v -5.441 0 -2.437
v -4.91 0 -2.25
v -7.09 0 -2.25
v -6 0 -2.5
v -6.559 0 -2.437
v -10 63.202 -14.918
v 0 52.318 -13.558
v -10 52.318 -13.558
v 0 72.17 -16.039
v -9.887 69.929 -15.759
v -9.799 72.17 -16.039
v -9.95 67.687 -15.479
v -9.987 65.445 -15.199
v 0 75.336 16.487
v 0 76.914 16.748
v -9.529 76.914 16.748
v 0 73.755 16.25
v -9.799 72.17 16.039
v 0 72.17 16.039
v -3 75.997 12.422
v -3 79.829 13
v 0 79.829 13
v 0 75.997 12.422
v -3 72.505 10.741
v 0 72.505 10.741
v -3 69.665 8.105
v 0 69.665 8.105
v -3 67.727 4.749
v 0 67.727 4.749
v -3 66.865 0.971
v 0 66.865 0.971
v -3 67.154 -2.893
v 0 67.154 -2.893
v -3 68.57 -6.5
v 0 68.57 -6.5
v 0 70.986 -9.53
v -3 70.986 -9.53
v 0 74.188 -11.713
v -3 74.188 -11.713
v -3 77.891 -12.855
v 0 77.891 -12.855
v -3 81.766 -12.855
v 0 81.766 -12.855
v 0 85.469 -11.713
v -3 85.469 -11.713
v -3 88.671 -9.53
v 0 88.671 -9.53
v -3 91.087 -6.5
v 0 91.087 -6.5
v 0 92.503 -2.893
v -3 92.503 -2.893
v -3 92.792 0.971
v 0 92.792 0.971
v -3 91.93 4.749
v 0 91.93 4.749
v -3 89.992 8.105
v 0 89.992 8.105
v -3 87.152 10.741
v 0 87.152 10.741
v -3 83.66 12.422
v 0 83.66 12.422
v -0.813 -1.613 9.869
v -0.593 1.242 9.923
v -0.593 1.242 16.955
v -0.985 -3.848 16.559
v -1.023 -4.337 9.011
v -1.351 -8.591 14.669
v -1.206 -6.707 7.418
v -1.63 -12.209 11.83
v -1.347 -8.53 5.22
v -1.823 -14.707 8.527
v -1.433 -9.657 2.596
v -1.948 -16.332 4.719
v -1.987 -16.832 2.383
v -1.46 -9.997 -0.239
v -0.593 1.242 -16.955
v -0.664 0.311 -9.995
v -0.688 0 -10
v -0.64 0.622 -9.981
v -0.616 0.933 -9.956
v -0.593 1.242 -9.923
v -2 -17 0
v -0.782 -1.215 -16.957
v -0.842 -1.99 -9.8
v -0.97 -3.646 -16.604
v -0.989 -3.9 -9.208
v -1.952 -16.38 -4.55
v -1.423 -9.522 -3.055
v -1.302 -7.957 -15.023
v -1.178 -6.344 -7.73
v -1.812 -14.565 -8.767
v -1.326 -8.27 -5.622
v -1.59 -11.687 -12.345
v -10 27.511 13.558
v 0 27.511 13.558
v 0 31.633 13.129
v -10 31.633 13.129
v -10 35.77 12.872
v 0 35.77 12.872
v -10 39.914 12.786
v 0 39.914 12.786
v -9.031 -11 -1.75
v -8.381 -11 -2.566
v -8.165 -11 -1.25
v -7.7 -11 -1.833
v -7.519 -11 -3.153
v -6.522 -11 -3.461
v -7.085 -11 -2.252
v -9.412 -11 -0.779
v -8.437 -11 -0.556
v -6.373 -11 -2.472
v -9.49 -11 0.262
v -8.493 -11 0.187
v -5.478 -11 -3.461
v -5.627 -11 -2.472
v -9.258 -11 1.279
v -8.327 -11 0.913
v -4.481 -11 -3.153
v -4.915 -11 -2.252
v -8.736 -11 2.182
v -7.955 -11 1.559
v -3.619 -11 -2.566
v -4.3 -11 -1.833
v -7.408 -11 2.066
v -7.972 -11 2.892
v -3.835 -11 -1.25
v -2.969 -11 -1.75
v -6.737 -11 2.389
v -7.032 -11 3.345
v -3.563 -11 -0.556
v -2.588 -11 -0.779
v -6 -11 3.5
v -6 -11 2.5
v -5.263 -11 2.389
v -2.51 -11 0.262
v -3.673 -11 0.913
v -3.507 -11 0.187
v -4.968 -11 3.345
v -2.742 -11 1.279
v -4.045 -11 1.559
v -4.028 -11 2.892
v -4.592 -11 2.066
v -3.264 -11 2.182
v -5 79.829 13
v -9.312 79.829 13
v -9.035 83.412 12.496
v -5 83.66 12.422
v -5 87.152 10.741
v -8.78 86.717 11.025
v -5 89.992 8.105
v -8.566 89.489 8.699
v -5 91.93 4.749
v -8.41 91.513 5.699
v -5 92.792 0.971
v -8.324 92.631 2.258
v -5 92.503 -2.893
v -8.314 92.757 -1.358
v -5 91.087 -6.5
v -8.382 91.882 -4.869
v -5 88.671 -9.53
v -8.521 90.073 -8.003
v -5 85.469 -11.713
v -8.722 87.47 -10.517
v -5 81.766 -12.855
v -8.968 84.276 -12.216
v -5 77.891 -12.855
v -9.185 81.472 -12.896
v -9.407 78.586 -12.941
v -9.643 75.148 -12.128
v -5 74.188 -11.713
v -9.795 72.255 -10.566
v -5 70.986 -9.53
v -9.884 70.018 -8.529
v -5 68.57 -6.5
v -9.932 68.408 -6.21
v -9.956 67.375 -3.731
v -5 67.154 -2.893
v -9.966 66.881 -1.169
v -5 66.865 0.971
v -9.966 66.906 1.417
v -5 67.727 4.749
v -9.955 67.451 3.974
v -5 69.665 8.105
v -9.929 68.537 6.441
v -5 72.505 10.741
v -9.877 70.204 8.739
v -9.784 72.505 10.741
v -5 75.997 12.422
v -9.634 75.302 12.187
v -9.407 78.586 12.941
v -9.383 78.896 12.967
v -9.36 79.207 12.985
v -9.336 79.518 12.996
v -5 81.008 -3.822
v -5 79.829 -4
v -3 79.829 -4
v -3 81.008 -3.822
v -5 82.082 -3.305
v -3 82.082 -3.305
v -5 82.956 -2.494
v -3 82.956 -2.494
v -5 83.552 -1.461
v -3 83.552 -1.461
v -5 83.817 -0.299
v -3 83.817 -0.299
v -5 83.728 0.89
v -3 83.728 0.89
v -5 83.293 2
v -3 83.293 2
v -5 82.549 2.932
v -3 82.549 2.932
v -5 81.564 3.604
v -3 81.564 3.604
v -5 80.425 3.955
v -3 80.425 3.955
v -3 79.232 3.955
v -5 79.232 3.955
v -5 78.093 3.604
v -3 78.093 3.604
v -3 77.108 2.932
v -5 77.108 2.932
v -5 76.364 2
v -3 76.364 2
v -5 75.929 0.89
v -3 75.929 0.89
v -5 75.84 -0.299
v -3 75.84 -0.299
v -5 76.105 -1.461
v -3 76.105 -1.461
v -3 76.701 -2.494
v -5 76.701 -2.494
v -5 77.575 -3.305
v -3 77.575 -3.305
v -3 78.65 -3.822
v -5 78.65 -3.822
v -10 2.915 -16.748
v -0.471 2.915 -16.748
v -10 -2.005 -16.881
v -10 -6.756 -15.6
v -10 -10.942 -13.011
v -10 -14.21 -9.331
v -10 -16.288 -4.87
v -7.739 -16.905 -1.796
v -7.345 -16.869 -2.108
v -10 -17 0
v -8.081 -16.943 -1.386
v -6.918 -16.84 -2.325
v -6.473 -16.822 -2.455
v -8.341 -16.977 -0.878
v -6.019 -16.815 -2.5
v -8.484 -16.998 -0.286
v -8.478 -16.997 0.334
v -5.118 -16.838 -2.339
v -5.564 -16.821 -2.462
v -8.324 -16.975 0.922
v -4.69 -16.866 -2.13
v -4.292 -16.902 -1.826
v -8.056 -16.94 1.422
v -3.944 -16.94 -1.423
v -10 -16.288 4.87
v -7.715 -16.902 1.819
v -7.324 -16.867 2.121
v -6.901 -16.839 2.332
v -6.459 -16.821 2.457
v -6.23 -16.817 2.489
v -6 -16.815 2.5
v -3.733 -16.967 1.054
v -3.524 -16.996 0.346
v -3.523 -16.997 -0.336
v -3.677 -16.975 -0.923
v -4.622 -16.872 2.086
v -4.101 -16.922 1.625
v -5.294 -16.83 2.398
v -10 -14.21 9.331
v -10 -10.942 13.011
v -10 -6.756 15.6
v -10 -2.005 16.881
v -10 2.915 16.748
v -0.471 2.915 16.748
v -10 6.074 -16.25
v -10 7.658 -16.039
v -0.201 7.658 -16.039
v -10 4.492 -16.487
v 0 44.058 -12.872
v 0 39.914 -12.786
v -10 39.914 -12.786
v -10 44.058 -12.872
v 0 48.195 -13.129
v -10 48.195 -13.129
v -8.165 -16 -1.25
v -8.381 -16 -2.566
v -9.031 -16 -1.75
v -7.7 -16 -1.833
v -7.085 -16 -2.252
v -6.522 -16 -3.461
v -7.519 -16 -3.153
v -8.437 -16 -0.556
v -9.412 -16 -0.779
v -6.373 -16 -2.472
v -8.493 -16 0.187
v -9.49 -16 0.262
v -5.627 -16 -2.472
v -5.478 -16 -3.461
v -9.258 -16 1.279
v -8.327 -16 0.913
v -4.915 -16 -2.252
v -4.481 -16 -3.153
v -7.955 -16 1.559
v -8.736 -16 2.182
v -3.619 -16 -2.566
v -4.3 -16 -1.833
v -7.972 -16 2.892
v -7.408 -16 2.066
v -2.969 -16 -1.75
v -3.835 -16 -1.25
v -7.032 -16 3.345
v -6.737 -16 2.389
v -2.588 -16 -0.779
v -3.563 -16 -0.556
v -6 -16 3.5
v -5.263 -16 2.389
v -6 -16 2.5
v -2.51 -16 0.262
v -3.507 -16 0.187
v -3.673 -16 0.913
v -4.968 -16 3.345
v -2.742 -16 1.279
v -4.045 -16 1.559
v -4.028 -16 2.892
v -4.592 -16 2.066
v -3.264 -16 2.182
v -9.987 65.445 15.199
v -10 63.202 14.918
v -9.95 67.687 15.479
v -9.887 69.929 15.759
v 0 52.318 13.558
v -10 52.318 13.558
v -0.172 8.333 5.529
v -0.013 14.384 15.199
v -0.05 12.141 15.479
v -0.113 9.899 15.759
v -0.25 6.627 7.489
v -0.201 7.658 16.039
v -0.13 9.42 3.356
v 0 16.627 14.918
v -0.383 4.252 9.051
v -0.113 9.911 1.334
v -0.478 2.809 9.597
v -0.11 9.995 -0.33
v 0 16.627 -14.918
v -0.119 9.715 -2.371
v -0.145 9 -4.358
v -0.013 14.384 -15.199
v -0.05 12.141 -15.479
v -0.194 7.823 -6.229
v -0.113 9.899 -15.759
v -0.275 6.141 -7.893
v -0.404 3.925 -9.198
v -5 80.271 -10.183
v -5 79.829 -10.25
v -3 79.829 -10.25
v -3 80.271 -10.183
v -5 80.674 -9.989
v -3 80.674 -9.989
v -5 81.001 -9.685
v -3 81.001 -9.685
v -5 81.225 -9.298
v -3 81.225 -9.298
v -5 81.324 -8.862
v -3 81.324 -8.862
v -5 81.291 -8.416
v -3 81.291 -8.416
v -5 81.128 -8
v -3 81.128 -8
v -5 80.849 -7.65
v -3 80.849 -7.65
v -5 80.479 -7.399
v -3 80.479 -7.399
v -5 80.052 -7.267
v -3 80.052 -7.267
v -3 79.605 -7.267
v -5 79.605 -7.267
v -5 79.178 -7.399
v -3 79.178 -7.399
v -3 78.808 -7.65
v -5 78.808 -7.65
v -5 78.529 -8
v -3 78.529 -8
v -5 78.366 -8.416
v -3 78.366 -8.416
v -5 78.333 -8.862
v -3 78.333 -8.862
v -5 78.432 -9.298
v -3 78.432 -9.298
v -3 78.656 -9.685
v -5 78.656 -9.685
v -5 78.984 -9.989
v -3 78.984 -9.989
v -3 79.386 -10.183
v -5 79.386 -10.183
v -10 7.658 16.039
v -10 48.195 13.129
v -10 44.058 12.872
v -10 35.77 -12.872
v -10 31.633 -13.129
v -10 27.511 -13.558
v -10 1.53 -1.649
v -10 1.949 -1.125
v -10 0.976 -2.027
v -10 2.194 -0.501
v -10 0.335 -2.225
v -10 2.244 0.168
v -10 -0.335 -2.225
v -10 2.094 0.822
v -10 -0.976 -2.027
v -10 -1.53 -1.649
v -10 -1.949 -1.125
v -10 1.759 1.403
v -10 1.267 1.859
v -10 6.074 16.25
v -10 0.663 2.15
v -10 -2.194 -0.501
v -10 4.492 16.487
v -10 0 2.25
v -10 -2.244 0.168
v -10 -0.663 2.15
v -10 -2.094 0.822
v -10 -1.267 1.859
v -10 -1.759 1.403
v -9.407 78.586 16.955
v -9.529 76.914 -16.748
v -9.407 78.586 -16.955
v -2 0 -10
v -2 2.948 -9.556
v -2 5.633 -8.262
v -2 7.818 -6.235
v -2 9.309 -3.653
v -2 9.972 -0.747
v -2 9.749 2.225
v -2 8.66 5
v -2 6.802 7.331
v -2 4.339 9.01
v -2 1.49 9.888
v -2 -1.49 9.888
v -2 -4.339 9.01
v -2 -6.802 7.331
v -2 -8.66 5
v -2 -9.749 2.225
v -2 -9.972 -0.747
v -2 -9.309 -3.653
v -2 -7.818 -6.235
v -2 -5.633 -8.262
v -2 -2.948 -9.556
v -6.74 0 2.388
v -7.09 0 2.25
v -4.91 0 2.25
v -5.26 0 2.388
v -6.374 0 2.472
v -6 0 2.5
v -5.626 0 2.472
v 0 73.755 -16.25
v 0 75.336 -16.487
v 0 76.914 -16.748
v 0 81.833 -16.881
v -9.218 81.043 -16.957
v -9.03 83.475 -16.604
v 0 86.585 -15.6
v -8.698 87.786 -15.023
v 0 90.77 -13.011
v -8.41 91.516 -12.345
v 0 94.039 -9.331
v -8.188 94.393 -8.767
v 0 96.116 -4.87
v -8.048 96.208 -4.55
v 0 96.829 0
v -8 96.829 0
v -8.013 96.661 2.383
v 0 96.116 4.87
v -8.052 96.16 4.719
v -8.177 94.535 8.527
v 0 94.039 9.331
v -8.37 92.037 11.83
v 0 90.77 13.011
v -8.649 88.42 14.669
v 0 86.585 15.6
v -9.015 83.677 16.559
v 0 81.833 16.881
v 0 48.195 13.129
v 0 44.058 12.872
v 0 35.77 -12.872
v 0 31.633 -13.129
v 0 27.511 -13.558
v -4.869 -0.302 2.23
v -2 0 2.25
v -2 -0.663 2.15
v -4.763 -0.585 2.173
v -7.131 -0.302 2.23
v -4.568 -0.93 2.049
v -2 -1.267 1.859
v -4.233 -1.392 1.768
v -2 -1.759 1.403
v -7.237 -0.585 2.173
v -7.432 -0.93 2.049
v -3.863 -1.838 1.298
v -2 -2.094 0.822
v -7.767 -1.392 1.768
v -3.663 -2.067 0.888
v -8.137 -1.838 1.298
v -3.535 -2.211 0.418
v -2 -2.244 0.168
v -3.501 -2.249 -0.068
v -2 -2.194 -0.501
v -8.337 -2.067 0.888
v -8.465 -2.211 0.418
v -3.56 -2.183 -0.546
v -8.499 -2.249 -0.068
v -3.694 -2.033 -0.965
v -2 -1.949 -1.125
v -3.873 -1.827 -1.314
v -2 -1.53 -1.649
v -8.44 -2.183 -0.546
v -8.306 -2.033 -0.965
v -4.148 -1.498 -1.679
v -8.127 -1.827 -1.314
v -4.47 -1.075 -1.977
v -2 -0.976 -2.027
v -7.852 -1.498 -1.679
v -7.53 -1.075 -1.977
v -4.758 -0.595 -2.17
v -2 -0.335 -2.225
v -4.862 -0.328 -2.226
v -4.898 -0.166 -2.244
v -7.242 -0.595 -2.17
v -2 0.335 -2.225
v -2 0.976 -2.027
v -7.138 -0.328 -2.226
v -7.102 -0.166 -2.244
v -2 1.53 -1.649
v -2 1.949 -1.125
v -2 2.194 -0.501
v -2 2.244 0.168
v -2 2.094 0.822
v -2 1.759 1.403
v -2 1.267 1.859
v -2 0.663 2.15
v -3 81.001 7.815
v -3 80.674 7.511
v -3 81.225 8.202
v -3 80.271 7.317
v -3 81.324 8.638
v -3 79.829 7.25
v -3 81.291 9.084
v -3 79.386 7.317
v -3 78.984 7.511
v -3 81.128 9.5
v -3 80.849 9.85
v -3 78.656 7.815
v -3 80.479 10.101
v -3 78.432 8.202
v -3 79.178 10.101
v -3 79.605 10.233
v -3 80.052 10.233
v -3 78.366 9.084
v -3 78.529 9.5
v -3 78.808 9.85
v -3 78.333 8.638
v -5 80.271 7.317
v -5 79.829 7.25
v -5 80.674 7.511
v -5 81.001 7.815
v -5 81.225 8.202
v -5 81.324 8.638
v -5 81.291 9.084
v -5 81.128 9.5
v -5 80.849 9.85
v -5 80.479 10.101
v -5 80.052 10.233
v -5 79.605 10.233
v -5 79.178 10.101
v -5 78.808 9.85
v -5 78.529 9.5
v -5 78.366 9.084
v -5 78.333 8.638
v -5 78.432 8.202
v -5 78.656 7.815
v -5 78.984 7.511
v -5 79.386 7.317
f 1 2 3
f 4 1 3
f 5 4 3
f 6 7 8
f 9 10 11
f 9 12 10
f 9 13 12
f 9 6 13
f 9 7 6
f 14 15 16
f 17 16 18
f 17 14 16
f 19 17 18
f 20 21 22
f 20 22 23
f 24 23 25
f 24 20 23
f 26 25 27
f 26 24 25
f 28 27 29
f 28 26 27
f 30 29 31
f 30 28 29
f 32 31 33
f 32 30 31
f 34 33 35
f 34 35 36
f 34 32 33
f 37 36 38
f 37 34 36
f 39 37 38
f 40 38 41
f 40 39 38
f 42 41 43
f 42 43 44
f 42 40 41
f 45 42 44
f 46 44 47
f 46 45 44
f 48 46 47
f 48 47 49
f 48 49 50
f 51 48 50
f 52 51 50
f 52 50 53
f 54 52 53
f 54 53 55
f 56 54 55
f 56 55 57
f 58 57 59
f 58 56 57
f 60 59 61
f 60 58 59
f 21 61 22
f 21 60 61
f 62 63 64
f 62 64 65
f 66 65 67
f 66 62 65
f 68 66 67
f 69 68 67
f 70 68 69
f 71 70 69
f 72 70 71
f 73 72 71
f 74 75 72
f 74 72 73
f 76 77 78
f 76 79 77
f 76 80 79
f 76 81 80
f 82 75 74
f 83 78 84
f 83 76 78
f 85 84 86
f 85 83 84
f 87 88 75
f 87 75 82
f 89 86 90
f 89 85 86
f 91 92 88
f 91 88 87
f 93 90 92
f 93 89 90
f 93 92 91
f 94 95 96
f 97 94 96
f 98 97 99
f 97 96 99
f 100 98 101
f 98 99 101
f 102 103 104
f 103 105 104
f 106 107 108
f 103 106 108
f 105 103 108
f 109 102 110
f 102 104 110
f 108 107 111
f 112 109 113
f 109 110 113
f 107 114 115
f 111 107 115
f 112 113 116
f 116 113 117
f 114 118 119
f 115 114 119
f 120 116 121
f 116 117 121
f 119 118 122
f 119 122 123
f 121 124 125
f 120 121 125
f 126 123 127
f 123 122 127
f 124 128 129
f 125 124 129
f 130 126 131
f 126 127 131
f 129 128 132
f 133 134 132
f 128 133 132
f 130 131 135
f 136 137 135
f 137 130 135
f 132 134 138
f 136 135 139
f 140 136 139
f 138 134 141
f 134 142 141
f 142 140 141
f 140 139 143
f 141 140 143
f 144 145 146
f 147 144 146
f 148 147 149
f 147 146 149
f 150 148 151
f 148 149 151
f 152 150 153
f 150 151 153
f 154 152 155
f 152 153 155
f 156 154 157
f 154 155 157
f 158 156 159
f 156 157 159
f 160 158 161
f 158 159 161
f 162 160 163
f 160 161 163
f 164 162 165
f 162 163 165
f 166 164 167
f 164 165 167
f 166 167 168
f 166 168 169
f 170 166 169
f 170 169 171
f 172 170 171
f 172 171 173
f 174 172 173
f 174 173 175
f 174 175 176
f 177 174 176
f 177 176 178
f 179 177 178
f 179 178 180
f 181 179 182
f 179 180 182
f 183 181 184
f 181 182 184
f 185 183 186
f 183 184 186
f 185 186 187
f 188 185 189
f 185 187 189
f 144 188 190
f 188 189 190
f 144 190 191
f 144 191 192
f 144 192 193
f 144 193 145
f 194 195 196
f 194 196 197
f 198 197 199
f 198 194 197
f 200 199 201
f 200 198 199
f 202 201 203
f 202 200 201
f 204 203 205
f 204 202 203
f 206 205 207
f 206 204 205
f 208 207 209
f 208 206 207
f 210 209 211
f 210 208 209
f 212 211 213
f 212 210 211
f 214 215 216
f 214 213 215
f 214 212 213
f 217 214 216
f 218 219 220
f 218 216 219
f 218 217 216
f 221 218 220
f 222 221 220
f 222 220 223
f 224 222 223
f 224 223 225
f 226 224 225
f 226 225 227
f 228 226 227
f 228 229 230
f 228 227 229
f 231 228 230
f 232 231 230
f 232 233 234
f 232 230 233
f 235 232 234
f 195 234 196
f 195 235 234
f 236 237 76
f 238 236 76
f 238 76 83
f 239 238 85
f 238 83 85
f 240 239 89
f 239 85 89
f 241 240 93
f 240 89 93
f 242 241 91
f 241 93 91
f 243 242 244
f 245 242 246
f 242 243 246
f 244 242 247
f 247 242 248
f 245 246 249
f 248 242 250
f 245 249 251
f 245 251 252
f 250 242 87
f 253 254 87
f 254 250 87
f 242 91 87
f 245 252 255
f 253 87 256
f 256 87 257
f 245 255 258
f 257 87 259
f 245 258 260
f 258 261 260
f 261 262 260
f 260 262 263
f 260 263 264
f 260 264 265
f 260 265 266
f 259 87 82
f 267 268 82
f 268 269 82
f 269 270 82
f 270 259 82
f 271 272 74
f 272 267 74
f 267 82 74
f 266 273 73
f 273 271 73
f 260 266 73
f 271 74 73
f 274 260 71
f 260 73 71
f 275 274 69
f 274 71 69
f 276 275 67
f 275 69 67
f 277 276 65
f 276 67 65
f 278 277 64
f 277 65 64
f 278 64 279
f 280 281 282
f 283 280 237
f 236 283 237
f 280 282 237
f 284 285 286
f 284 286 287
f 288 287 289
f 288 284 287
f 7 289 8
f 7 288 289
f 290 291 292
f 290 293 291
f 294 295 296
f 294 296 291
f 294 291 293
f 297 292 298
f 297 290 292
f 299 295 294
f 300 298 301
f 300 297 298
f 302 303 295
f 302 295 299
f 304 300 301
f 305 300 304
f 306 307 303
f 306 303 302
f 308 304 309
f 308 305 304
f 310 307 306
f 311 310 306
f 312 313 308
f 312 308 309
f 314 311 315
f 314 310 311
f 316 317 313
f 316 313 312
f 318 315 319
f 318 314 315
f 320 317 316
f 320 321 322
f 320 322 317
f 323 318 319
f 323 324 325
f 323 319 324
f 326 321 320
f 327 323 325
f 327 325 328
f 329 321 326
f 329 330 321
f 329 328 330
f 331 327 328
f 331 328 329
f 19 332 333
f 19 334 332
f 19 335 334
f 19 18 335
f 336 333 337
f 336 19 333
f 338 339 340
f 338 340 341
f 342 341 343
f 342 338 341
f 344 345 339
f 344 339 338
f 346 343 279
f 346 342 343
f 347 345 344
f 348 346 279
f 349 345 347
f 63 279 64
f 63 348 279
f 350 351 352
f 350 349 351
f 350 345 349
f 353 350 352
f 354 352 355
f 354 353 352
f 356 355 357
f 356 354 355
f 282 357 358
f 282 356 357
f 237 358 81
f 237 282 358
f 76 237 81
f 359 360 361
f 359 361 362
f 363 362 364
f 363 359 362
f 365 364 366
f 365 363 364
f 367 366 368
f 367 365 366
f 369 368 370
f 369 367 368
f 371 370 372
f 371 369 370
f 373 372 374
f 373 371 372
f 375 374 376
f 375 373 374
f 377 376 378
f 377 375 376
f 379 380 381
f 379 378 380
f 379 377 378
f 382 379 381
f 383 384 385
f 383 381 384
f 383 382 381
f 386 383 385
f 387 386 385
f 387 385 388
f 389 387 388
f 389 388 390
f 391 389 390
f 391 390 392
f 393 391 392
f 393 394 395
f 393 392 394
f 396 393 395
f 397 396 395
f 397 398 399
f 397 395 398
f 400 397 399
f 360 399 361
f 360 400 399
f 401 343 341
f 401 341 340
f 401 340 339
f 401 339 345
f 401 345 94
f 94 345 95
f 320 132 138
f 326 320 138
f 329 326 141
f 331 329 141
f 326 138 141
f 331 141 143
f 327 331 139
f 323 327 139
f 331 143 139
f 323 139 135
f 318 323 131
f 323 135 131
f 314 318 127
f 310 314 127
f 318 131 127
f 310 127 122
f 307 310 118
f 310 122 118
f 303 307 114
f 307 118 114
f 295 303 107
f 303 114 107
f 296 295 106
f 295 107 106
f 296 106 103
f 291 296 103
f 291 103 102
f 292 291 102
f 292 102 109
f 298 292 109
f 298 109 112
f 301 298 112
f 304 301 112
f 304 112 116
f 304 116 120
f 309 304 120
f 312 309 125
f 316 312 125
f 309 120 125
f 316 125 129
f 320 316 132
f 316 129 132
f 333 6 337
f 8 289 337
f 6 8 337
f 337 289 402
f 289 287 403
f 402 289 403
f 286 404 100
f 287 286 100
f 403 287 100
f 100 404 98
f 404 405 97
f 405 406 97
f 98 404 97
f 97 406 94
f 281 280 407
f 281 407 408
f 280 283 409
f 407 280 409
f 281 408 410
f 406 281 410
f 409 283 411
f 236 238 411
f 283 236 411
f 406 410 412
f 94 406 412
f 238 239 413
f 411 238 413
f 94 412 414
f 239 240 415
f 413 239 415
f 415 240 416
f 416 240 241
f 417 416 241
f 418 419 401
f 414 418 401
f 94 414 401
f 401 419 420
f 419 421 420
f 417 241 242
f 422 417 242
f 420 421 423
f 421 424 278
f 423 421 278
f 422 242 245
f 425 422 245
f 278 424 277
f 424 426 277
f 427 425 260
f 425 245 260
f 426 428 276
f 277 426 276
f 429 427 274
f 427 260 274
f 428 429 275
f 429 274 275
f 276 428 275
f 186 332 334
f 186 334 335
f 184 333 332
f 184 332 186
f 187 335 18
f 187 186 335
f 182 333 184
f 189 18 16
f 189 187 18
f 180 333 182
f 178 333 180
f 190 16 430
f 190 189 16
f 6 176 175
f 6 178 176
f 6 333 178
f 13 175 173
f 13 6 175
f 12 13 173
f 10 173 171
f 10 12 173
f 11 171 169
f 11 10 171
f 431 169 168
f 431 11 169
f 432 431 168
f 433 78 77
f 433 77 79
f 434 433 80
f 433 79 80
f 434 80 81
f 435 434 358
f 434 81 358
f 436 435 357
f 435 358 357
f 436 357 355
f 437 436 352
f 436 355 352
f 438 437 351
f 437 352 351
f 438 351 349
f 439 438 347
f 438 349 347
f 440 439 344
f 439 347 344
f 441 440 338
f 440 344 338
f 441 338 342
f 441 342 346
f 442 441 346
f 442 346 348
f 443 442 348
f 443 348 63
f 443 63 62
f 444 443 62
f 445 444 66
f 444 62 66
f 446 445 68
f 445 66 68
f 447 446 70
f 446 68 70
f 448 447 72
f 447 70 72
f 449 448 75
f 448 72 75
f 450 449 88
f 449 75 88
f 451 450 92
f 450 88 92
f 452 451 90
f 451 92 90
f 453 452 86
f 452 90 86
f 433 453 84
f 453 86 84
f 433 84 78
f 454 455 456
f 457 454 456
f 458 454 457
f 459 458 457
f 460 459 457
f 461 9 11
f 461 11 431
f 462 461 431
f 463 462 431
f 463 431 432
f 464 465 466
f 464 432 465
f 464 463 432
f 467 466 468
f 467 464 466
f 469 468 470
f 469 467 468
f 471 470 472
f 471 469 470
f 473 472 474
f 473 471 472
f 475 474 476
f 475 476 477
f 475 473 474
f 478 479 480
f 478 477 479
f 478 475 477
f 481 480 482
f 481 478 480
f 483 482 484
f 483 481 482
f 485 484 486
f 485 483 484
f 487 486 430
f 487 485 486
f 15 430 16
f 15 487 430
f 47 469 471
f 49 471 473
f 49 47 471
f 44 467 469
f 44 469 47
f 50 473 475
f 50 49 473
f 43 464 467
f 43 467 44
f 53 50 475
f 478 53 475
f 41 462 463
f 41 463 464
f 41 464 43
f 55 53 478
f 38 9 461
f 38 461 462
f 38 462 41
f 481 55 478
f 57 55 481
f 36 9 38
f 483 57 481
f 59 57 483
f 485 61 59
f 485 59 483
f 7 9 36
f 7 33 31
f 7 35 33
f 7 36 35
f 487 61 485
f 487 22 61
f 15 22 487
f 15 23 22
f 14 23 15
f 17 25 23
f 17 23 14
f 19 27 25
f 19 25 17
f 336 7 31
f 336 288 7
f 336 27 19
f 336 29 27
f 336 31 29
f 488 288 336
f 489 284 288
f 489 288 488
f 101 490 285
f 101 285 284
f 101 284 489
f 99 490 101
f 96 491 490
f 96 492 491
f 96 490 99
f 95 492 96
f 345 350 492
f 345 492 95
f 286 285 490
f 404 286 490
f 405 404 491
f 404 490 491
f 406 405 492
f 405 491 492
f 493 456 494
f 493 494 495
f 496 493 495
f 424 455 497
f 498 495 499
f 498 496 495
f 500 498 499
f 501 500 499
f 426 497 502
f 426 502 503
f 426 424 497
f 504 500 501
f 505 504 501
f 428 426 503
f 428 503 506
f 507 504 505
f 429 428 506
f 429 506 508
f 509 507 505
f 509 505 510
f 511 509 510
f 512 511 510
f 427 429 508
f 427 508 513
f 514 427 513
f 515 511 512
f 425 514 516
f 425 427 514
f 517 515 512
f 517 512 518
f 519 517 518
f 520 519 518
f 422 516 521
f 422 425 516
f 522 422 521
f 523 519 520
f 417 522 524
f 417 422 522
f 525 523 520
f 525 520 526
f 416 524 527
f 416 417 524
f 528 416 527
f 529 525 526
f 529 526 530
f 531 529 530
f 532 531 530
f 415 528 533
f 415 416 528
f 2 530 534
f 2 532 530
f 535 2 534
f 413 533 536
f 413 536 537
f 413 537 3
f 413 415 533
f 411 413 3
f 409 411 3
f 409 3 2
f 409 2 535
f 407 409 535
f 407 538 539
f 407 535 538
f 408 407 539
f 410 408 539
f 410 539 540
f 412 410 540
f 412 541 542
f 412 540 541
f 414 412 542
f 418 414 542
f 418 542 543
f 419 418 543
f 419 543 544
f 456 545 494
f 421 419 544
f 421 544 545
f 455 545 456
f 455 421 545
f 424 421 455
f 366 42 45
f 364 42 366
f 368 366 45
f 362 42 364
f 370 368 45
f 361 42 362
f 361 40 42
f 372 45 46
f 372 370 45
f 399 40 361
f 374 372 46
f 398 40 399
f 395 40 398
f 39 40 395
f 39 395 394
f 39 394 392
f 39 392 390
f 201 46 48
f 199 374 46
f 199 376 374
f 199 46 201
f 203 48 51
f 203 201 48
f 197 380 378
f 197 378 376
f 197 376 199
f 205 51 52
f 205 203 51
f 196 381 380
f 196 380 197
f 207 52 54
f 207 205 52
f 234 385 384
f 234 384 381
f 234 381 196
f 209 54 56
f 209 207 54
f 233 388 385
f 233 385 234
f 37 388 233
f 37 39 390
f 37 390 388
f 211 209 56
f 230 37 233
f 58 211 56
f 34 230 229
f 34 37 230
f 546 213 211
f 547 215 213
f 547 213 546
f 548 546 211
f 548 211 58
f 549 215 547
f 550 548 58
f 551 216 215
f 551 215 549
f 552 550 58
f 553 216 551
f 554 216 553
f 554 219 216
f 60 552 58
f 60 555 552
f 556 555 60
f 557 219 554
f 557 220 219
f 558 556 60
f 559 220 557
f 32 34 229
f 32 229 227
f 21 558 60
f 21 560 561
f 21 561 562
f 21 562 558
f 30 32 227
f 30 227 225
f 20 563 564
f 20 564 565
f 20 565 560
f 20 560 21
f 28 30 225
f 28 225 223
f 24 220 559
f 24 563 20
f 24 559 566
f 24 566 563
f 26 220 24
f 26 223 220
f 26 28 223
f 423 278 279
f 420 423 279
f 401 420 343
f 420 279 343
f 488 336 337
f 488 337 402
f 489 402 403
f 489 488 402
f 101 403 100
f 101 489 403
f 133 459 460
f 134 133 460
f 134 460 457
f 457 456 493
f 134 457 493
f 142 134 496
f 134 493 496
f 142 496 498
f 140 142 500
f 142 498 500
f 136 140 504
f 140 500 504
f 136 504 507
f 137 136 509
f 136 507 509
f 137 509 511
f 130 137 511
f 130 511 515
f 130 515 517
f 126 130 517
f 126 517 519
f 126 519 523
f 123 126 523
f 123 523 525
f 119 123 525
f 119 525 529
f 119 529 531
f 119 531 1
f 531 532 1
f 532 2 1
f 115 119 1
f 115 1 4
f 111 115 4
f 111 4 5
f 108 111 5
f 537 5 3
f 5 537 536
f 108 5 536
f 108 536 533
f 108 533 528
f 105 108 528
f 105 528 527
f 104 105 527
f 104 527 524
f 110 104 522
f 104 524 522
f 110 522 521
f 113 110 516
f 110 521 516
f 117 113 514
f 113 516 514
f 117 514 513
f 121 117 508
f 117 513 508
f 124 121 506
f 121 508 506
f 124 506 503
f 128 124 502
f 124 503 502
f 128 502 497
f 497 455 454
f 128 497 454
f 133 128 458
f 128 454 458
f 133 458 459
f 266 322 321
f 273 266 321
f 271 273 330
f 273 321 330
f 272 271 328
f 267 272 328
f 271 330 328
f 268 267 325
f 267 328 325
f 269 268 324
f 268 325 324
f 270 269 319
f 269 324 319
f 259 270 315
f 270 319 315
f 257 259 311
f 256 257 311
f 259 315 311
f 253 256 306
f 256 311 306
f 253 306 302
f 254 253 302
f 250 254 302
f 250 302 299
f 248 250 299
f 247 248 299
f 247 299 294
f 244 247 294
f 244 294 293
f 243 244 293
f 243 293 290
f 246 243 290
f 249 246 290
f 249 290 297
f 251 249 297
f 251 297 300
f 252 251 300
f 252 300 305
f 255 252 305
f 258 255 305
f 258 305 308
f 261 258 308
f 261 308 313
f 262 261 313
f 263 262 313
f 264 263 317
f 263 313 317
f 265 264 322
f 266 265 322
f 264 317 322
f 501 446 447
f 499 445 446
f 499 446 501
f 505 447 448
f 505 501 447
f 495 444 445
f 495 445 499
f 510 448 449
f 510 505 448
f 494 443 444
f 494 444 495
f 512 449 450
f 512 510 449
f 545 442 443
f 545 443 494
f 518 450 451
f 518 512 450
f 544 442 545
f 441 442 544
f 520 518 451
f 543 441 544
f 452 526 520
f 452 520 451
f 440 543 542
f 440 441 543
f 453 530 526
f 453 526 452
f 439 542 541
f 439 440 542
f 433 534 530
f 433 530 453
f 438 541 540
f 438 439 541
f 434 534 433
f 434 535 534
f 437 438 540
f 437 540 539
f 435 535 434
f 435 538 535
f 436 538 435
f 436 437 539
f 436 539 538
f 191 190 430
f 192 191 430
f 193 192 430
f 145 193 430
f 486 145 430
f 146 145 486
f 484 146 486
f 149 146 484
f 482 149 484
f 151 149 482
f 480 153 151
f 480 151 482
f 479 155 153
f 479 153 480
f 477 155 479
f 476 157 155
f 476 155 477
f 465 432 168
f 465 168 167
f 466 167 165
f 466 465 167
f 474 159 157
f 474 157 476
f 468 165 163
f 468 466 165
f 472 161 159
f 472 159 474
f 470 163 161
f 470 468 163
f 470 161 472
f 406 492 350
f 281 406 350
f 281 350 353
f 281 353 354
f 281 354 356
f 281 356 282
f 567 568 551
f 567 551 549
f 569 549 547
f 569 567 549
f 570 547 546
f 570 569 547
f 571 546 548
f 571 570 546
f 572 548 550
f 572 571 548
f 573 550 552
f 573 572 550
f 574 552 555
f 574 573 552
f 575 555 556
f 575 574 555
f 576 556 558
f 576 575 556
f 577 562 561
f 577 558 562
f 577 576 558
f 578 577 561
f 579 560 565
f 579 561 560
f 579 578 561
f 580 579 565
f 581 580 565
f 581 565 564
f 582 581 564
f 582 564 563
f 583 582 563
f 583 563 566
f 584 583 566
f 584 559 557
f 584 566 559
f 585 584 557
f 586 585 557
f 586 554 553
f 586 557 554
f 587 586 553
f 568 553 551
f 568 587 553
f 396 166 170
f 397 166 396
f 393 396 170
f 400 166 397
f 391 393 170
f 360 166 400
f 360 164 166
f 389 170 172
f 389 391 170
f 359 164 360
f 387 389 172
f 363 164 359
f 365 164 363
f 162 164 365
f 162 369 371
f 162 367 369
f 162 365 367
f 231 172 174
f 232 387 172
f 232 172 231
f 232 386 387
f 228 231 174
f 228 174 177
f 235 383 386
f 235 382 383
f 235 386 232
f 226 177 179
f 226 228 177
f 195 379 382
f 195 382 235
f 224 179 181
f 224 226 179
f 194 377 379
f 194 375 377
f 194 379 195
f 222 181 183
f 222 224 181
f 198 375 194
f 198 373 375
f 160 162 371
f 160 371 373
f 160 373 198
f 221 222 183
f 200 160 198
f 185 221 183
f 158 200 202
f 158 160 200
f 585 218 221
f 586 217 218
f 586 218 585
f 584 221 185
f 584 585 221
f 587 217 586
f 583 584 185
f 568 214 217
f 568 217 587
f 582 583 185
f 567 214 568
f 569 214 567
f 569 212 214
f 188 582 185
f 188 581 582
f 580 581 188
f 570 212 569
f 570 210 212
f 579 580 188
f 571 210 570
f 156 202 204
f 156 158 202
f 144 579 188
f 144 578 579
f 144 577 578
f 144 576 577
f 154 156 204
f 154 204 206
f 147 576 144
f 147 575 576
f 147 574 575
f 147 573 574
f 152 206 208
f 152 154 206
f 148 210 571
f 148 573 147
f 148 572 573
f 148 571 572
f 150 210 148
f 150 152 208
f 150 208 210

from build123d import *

# Parameters (mm, degrees)
SALIENTE_EXTRUIR1_DEPTH     = 10
CROQUIS3_R                  = 10
CORTAR_EXTRUIR1_DEPTH       = 2
CORTAR_EXTRUIR5_START       = -10
CROQUIS7_R                  = 2.25
CORTAR_EXTRUIR5_DEPTH       = 55.115174372
CROQUIS8_R                  = 2.5
CORTAR_EXTRUIR6_DEPTH       = 19
CORTAR_EXTRUIR19_START      = -11
CROQUIS12_R                 = 3.5
CORTAR_EXTRUIR19_DEPTH      = 5
CORTAR_EXTRUIR20_DEPTH      = 99.634499619
CORTAR_EXTRUIR20_DEPTH_BACK = 99.634499619
CROQUIS13_R                 = 4
CROQUIS13_R_2               = 1.5
CROQUIS17_R                 = 13
CORTAR_EXTRUIR22_DEPTH      = 5
CORTAR_EXTRUIR23_START      = -3
CROQUIS15_R                 = 13
CORTAR_EXTRUIR23_DEPTH      = 3
CORTAR_EXTRUIR24_DEPTH      = 99.816823039
CORTAR_EXTRUIR24_DEPTH_BACK = 99.816823039
CROQUIS18_OUTSIDE_W         = 35.844
CROQUIS18_OUTSIDE_H         = 139.673


with BuildPart() as part:
    # Croquis1 → Saliente-Extruir1 (new body)
    with BuildSketch(Plane(origin=(0, 0, 0), x_dir=(0, 0, -1), z_dir=(1, 0, 0))):
        with BuildLine():
            Line((-16.039395606, 7.658342494), (-13.557839382, 27.510792285))
            ThreePointArc((-13.557839382, 27.510792285), (-12.978866844, 33.700521588), (-12.785627053, 39.914265744))
            Line((-12.785627053, 39.914265744), (12.785627053, 39.914265744))
            ThreePointArc((12.785627053, 39.914265744), (12.978866844, 33.700521588), (13.557839382, 27.510792285))
            Line((13.557839382, 27.510792285), (16.039395606, 7.658342494))
            ThreePointArc((16.039395606, 7.658342494), (16.365368489, 5.282403528), (16.748223211, 2.914964711))
            ThreePointArc((16.748223211, 2.914964711), (0, -17), (-16.748223211, 2.914964711))
            ThreePointArc((-16.748223211, 2.914964711), (-16.365368489, 5.282403528), (-16.039395606, 7.658342494))
        make_face()
    saliente_extruir1 = extrude(amount=-SALIENTE_EXTRUIR1_DEPTH)

    # Croquis3 → Cortar-Extruir1 (cut)
    with BuildSketch(Plane(origin=(0, 0, 0), x_dir=(0, 0, -1), z_dir=(1, 0, 0))):
        Circle(CROQUIS3_R)
    cortar_extruir1 = extrude(amount=-CORTAR_EXTRUIR1_DEPTH, mode=Mode.SUBTRACT)

    # Croquis7 → Cortar-Extruir5 (cut)
    with BuildSketch(Plane(origin=(-2, 0, 0), x_dir=(0, 0, -1), z_dir=(1, 0, 0)).offset(CORTAR_EXTRUIR5_START)):
        with Locations(Location((0, 0, 0), (0, 0, 180))):
            Circle(CROQUIS7_R)
    cortar_extruir5 = extrude(amount=CORTAR_EXTRUIR5_DEPTH, mode=Mode.SUBTRACT)

    # Croquis8 → Cortar-Extruir6 (cut)
    with BuildSketch(Plane(origin=(0, 0, 0), x_dir=(1, 0, 0), z_dir=(0, 1, 0))):
        with Locations(Location((-6, 0, 0), (0, 0, 270))):
            Circle(CROQUIS8_R)
    extrude(amount=-CORTAR_EXTRUIR6_DEPTH, mode=Mode.SUBTRACT)

    # Croquis12 → Cortar-Extruir19 (cut)
    with BuildSketch(Plane(origin=(0, 0, 0), x_dir=(1, 0, 0), z_dir=(0, 1, 0)).offset(CORTAR_EXTRUIR19_START)):
        with Locations(Location((-6, 0, 0), (0, 0, 270))):
            Circle(CROQUIS12_R)
    extrude(amount=-CORTAR_EXTRUIR19_DEPTH, mode=Mode.SUBTRACT)

    # Simetría1: Saliente-Extruir1, Cortar-Extruir1, Cortar-Extruir5 across plane
    add(saliente_extruir1.mirror(Plane(origin=(-10, 39.914265744, 12.785627053), x_dir=(0, 0, 1), z_dir=(0, 1, 0))))
    add(cortar_extruir1.mirror(Plane(origin=(-10, 39.914265744, 12.785627053), x_dir=(0, 0, 1), z_dir=(0, 1, 0))), mode=Mode.SUBTRACT)
    add(cortar_extruir5.mirror(Plane(origin=(-10, 39.914265744, 12.785627053), x_dir=(0, 0, 1), z_dir=(0, 1, 0))), mode=Mode.SUBTRACT)

    # Croquis13 → Cortar-Extruir20 (cut, two sides: drawn at the far end of the back side and taken through both)
    with BuildSketch(Plane(origin=(-2, 0, 0), x_dir=(0, 0, -1), z_dir=(1, 0, 0)).offset(-CORTAR_EXTRUIR20_DEPTH_BACK)):
        with Locations((0, 79.828531488)):
            Circle(CROQUIS13_R)
        with Locations((8.75, 79.828531488)):
            Circle(CROQUIS13_R_2)
        with Locations((-8.75, 79.828531488)):
            Circle(CROQUIS13_R_2)
    extrude(amount=CORTAR_EXTRUIR20_DEPTH + CORTAR_EXTRUIR20_DEPTH_BACK, mode=Mode.SUBTRACT)

    # Croquis17 → Cortar-Extruir22 (cut)
    with BuildSketch(Plane.ZY.offset(10)):
        with Locations((0, 79.828531488)):
            Circle(CROQUIS17_R)
    extrude(amount=-CORTAR_EXTRUIR22_DEPTH, mode=Mode.SUBTRACT)

    # Croquis15 → Cortar-Extruir23 (cut)
    with BuildSketch(Plane(origin=(0, 0, 0), x_dir=(0, 0, -1), z_dir=(1, 0, 0)).offset(CORTAR_EXTRUIR23_START)):
        with Locations(Location((0, 79.828531488, 0), (0, 0, 180))):
            Circle(CROQUIS15_R)
    extrude(amount=CORTAR_EXTRUIR23_DEPTH, mode=Mode.SUBTRACT)

    # Croquis18 outside → Cortar-Extruir24 (cut, two sides: drawn at the far end of the back side and taken through both)
    with BuildSketch(Plane.XY.offset(-CORTAR_EXTRUIR24_DEPTH_BACK)):
        with Locations((-5, 39.9145)):
            Rectangle(CROQUIS18_OUTSIDE_W, CROQUIS18_OUTSIDE_H)
        with BuildLine():
            Line((-8, 96.828531488), (0, 96.828531488))
            Line((0, 96.828531488), (0, 16.62668343))
            ThreePointArc((0, 16.62668343), (-0.148203384, 8.928671381), (-0.592593895, 1.242068046))
            Line((-0.592593895, 1.242068046), (-2, -17))
            Line((-2, -17), (-10, -17))
            Line((-10, -17), (-10, 63.201848057))
            ThreePointArc((-10, 63.201848057), (-9.851796616, 70.899860107), (-9.407406105, 78.586463442))
            Line((-9.407406105, 78.586463442), (-8, 96.828531488))
        make_face(mode=Mode.SUBTRACT)
    extrude(amount=CORTAR_EXTRUIR24_DEPTH + CORTAR_EXTRUIR24_DEPTH_BACK, mode=Mode.SUBTRACT)


solid = part.part
